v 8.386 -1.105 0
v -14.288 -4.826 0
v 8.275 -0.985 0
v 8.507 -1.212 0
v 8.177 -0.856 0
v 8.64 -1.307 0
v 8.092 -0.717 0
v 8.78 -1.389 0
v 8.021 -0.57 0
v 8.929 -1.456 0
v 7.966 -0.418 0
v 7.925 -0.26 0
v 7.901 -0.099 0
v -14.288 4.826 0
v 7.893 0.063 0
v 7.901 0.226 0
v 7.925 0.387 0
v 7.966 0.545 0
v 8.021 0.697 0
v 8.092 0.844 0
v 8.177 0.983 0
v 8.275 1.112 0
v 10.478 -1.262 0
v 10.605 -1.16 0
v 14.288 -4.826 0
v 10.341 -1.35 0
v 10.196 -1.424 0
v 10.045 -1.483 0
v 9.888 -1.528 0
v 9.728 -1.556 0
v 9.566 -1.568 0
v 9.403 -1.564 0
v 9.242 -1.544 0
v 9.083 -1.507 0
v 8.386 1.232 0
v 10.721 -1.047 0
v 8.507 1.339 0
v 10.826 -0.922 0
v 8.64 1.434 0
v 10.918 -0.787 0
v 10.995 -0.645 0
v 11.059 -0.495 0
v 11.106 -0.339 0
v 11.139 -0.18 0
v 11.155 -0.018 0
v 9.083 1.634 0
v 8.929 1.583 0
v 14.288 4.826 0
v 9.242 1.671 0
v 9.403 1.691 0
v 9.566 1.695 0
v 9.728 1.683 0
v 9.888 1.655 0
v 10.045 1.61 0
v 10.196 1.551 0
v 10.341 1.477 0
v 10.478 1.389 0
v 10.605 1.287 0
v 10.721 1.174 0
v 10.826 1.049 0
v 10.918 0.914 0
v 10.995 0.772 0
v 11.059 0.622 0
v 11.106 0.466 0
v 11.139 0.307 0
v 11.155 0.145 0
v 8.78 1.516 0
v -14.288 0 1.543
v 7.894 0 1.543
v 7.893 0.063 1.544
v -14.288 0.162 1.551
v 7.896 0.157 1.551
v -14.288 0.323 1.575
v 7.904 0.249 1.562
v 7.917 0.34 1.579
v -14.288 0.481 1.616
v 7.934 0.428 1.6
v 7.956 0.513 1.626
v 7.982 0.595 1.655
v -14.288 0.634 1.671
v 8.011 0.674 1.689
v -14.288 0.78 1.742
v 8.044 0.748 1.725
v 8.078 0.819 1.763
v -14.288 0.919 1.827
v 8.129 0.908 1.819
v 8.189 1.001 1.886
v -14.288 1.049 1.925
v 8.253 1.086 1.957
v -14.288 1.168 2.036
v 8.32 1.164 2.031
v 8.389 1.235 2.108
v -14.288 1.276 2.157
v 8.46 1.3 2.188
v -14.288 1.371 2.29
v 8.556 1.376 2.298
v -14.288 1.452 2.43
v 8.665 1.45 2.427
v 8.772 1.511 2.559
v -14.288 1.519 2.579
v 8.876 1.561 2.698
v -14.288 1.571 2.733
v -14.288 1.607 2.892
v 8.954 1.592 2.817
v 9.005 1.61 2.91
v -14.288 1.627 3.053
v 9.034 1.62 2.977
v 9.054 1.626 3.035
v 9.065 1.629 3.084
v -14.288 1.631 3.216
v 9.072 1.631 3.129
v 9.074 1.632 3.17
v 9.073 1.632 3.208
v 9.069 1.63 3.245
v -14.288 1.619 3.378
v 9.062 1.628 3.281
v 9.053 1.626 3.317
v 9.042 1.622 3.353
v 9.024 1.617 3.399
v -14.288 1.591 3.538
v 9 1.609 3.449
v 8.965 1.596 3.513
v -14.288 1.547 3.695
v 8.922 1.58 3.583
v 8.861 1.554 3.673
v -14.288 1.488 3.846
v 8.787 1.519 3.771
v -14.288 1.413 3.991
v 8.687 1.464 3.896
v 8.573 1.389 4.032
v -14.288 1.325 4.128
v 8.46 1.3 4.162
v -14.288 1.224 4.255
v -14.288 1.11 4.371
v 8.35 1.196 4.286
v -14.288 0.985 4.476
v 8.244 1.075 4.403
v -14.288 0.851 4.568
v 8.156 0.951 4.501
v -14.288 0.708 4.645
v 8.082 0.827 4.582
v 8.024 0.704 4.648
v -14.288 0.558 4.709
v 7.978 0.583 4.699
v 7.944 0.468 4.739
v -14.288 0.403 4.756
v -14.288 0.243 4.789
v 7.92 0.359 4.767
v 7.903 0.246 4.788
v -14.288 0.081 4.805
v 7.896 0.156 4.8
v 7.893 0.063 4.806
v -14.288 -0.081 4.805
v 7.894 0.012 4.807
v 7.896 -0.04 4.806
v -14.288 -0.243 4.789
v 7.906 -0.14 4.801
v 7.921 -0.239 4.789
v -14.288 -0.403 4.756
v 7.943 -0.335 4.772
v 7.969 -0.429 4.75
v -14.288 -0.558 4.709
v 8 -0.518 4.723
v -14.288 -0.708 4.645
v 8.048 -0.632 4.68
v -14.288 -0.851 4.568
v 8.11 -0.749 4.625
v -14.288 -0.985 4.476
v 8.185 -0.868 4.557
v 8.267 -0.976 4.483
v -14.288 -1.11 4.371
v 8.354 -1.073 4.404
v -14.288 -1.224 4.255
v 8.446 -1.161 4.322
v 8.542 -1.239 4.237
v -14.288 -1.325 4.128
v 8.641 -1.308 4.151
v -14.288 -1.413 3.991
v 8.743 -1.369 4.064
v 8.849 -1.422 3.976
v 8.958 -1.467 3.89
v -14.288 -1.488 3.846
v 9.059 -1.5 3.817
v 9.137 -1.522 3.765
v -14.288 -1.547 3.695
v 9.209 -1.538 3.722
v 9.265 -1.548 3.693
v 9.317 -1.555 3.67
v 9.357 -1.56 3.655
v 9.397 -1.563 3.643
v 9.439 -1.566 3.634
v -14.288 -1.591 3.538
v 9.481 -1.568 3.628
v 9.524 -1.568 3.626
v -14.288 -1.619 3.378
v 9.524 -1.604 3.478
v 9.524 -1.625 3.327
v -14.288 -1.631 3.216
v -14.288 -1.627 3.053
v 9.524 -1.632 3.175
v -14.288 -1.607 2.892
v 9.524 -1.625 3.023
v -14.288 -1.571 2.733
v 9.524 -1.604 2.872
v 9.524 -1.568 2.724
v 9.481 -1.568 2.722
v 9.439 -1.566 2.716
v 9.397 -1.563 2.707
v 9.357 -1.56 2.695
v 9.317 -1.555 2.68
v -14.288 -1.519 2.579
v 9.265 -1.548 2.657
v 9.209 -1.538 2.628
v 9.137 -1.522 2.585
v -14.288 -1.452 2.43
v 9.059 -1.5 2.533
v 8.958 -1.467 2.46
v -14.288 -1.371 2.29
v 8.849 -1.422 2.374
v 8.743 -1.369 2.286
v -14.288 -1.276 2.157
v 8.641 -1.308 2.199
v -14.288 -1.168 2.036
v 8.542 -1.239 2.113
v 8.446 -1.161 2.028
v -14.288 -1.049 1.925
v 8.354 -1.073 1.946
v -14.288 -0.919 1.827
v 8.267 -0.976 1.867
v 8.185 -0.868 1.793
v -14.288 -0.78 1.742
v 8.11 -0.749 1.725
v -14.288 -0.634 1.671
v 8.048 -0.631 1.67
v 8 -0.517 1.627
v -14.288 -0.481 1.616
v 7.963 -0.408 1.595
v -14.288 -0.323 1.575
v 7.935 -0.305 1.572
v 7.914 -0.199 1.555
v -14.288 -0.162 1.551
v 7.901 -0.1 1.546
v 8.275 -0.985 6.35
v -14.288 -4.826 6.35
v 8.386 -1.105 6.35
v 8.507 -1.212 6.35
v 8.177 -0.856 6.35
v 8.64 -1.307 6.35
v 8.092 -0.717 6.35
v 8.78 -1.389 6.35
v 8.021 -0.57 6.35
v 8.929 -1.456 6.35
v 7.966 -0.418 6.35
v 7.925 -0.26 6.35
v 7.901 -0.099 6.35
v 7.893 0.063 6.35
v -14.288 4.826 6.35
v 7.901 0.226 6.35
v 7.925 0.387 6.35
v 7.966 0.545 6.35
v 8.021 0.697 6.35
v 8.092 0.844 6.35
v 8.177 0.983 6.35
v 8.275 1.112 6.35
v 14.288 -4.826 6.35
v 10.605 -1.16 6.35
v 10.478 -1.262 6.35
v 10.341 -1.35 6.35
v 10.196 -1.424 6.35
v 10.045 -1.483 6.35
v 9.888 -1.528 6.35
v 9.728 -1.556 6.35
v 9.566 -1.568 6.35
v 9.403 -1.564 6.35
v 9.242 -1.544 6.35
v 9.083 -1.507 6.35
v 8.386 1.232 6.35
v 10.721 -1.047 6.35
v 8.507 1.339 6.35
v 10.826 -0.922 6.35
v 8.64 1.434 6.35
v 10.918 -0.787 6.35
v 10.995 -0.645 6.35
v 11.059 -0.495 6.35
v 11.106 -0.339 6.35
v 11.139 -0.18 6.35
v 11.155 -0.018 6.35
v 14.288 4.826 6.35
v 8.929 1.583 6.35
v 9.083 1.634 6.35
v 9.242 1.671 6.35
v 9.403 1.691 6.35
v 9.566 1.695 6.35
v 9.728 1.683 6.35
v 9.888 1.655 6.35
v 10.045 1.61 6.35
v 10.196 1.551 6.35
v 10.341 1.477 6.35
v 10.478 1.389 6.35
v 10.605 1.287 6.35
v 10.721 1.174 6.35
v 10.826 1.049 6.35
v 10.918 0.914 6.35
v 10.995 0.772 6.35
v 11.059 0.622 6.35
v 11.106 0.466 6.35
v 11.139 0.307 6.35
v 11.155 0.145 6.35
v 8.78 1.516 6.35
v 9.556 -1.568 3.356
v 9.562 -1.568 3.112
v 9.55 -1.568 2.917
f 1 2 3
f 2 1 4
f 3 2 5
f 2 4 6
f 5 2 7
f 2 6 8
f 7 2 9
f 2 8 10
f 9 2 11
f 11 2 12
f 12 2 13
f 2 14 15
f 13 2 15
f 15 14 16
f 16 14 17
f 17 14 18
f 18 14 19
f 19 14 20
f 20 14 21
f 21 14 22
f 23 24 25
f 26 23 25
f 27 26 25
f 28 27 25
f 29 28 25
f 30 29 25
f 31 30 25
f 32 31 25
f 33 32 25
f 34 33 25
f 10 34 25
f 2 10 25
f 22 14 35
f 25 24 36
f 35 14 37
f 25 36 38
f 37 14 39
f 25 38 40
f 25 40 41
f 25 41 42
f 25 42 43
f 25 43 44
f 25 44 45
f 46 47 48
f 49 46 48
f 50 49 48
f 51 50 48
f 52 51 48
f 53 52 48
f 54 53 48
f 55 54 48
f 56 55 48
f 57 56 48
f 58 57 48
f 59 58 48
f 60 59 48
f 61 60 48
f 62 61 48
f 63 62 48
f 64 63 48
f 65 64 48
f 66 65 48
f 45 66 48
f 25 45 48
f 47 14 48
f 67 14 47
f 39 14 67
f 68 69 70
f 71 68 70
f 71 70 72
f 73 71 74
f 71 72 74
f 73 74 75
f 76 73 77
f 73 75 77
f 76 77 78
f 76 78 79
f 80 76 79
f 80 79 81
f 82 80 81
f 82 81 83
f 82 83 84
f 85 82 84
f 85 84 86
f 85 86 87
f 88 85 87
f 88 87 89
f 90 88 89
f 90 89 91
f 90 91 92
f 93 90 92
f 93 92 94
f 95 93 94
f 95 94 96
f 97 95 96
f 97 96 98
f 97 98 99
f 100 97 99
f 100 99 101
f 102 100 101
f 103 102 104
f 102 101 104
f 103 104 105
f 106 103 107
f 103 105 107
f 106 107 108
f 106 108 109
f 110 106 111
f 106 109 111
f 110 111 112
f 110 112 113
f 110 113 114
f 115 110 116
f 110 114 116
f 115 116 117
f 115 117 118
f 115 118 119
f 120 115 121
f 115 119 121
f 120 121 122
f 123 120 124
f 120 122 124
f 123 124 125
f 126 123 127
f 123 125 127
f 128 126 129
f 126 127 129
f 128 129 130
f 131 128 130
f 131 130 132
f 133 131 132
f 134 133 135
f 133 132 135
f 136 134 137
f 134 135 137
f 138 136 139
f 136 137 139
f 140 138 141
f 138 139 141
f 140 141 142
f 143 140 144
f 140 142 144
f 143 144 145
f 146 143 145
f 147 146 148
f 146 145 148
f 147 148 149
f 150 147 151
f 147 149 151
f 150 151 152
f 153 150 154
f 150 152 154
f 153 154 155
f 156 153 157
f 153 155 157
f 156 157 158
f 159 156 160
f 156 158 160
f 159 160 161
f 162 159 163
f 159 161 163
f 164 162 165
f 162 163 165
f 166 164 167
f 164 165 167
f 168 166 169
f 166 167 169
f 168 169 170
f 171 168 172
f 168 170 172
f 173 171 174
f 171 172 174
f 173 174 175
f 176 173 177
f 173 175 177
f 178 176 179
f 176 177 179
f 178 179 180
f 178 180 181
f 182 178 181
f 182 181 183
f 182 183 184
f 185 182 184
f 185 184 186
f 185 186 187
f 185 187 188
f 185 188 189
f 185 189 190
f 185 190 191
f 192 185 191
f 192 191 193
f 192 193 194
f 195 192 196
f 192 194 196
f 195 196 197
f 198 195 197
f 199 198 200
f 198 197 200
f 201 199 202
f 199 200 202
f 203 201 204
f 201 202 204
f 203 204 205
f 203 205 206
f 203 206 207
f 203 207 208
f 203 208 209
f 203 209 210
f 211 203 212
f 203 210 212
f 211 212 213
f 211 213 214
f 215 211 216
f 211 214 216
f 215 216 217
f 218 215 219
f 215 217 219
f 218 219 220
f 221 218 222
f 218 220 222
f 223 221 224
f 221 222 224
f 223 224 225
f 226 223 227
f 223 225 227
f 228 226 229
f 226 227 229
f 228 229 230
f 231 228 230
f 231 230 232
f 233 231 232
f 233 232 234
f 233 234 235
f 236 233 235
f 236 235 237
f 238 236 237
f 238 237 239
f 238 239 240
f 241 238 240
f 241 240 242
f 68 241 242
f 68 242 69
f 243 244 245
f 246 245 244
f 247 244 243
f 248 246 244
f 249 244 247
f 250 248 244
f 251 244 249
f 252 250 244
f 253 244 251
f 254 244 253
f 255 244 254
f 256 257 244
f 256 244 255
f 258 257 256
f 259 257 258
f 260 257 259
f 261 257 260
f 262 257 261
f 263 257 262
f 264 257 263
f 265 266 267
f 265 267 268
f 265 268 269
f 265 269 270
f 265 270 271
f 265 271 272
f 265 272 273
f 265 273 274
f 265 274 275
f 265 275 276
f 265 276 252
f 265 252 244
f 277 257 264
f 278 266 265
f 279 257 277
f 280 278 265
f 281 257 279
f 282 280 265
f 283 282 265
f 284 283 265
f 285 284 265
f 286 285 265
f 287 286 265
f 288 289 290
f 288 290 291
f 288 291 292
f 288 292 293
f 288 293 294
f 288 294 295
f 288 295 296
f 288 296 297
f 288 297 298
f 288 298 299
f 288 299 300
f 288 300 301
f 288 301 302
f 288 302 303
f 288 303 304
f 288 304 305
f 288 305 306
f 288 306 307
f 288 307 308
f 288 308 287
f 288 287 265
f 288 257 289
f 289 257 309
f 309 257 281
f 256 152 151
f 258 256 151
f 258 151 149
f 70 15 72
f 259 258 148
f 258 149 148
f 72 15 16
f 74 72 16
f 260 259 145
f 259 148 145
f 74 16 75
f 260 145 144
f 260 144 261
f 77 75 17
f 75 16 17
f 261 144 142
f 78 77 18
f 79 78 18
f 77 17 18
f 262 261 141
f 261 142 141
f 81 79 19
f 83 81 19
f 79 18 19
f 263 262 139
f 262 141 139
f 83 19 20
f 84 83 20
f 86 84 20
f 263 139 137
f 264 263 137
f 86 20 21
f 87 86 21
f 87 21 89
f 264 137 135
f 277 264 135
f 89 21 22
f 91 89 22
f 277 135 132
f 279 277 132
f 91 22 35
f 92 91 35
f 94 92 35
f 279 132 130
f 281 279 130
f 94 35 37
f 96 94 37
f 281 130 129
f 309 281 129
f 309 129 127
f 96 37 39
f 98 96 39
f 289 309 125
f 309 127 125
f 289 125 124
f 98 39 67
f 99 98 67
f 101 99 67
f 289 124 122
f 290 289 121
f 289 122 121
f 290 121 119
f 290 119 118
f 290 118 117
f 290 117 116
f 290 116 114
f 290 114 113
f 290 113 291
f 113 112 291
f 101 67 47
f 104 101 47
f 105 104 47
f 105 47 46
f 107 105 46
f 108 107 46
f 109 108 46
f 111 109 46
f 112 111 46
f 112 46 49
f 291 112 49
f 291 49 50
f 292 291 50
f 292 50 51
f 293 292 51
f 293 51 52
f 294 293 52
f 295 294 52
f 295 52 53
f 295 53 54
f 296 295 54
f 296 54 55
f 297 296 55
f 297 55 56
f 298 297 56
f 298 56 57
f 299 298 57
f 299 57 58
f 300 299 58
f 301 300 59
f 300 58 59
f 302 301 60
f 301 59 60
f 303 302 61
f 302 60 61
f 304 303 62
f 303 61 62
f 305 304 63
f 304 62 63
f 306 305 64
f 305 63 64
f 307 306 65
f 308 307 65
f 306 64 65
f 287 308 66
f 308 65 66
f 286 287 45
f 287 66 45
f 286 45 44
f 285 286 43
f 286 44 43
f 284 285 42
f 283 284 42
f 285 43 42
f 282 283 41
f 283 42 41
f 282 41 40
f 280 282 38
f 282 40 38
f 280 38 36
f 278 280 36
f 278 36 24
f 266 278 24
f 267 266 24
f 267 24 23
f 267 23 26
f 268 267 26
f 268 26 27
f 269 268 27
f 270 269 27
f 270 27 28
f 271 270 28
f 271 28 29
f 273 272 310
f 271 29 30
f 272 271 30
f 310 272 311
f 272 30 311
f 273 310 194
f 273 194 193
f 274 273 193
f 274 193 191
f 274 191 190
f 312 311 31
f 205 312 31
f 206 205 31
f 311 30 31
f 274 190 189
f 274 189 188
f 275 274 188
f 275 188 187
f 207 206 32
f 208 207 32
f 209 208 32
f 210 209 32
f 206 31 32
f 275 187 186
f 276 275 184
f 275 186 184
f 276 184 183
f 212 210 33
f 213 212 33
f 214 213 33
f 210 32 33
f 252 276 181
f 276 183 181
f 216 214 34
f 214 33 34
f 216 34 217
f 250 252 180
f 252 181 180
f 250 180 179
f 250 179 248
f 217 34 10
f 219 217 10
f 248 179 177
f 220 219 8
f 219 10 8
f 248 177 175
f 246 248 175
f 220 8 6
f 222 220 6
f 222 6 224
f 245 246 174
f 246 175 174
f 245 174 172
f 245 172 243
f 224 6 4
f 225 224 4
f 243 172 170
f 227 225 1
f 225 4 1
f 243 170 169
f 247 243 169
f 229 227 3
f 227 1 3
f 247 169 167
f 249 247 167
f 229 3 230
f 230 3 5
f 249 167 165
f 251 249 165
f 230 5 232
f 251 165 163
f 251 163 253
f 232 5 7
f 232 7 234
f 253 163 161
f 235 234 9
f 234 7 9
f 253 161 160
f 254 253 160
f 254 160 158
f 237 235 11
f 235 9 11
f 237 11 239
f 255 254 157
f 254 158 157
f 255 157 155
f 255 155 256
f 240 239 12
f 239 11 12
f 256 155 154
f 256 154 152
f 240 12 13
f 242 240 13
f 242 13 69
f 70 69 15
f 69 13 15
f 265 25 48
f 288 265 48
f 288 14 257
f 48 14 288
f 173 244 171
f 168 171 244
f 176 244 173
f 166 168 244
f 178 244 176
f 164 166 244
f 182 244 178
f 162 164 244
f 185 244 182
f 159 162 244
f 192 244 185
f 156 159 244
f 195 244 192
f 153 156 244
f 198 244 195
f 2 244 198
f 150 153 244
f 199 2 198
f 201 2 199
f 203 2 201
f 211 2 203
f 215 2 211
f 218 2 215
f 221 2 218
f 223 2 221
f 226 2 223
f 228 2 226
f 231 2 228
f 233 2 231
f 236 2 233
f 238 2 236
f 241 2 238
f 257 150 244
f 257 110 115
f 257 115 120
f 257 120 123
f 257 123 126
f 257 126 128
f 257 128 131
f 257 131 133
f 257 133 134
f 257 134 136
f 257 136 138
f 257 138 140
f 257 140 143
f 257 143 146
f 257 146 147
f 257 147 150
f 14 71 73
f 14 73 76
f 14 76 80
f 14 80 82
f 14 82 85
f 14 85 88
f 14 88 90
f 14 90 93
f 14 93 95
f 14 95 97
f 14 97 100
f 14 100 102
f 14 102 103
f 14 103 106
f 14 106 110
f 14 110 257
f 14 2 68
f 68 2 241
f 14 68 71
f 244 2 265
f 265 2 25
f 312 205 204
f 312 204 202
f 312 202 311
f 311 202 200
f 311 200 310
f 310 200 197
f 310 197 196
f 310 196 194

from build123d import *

# Parameters (mm, degrees)
SKETCH1_W                 = 28.575
SKETCH1_H                 = 9.652
BOSS_EXTRUDE1_DEPTH       = 6.35
F_4_CLEARANCE_HOLE1_D     = 3.2639
F_4_CLEARANCE_HOLE2_D     = 3.2639
F_4_CLEARANCE_HOLE2_DEPTH = 23.8115
F_4_CLEARANCE_HOLE2_TIP   = 0.980574487


with BuildPart() as part:
    # Sketch1 → Boss-Extrude1 (new body)
    with BuildSketch(Plane.XY):
        Rectangle(SKETCH1_W, SKETCH1_H)
    extrude(amount=BOSS_EXTRUDE1_DEPTH)

    # #4 Clearance Hole1 (through all)
    with Locations(Plane.XY.offset(6.35)):
        with Locations((9.525, 0.0635)):
            Hole(F_4_CLEARANCE_HOLE1_D / 2)

    # #4 Clearance Hole2
    with Locations(Plane.ZY.offset(14.2875)):
        with Locations((3.175, 0)):
            Hole(F_4_CLEARANCE_HOLE2_D / 2, depth=F_4_CLEARANCE_HOLE2_DEPTH)
            with Locations((0, 0, -(F_4_CLEARANCE_HOLE2_DEPTH + F_4_CLEARANCE_HOLE2_TIP / 2))):  # 118° drill point
                Cone(0, F_4_CLEARANCE_HOLE2_D / 2, F_4_CLEARANCE_HOLE2_TIP, mode=Mode.SUBTRACT)


solid = part.part
